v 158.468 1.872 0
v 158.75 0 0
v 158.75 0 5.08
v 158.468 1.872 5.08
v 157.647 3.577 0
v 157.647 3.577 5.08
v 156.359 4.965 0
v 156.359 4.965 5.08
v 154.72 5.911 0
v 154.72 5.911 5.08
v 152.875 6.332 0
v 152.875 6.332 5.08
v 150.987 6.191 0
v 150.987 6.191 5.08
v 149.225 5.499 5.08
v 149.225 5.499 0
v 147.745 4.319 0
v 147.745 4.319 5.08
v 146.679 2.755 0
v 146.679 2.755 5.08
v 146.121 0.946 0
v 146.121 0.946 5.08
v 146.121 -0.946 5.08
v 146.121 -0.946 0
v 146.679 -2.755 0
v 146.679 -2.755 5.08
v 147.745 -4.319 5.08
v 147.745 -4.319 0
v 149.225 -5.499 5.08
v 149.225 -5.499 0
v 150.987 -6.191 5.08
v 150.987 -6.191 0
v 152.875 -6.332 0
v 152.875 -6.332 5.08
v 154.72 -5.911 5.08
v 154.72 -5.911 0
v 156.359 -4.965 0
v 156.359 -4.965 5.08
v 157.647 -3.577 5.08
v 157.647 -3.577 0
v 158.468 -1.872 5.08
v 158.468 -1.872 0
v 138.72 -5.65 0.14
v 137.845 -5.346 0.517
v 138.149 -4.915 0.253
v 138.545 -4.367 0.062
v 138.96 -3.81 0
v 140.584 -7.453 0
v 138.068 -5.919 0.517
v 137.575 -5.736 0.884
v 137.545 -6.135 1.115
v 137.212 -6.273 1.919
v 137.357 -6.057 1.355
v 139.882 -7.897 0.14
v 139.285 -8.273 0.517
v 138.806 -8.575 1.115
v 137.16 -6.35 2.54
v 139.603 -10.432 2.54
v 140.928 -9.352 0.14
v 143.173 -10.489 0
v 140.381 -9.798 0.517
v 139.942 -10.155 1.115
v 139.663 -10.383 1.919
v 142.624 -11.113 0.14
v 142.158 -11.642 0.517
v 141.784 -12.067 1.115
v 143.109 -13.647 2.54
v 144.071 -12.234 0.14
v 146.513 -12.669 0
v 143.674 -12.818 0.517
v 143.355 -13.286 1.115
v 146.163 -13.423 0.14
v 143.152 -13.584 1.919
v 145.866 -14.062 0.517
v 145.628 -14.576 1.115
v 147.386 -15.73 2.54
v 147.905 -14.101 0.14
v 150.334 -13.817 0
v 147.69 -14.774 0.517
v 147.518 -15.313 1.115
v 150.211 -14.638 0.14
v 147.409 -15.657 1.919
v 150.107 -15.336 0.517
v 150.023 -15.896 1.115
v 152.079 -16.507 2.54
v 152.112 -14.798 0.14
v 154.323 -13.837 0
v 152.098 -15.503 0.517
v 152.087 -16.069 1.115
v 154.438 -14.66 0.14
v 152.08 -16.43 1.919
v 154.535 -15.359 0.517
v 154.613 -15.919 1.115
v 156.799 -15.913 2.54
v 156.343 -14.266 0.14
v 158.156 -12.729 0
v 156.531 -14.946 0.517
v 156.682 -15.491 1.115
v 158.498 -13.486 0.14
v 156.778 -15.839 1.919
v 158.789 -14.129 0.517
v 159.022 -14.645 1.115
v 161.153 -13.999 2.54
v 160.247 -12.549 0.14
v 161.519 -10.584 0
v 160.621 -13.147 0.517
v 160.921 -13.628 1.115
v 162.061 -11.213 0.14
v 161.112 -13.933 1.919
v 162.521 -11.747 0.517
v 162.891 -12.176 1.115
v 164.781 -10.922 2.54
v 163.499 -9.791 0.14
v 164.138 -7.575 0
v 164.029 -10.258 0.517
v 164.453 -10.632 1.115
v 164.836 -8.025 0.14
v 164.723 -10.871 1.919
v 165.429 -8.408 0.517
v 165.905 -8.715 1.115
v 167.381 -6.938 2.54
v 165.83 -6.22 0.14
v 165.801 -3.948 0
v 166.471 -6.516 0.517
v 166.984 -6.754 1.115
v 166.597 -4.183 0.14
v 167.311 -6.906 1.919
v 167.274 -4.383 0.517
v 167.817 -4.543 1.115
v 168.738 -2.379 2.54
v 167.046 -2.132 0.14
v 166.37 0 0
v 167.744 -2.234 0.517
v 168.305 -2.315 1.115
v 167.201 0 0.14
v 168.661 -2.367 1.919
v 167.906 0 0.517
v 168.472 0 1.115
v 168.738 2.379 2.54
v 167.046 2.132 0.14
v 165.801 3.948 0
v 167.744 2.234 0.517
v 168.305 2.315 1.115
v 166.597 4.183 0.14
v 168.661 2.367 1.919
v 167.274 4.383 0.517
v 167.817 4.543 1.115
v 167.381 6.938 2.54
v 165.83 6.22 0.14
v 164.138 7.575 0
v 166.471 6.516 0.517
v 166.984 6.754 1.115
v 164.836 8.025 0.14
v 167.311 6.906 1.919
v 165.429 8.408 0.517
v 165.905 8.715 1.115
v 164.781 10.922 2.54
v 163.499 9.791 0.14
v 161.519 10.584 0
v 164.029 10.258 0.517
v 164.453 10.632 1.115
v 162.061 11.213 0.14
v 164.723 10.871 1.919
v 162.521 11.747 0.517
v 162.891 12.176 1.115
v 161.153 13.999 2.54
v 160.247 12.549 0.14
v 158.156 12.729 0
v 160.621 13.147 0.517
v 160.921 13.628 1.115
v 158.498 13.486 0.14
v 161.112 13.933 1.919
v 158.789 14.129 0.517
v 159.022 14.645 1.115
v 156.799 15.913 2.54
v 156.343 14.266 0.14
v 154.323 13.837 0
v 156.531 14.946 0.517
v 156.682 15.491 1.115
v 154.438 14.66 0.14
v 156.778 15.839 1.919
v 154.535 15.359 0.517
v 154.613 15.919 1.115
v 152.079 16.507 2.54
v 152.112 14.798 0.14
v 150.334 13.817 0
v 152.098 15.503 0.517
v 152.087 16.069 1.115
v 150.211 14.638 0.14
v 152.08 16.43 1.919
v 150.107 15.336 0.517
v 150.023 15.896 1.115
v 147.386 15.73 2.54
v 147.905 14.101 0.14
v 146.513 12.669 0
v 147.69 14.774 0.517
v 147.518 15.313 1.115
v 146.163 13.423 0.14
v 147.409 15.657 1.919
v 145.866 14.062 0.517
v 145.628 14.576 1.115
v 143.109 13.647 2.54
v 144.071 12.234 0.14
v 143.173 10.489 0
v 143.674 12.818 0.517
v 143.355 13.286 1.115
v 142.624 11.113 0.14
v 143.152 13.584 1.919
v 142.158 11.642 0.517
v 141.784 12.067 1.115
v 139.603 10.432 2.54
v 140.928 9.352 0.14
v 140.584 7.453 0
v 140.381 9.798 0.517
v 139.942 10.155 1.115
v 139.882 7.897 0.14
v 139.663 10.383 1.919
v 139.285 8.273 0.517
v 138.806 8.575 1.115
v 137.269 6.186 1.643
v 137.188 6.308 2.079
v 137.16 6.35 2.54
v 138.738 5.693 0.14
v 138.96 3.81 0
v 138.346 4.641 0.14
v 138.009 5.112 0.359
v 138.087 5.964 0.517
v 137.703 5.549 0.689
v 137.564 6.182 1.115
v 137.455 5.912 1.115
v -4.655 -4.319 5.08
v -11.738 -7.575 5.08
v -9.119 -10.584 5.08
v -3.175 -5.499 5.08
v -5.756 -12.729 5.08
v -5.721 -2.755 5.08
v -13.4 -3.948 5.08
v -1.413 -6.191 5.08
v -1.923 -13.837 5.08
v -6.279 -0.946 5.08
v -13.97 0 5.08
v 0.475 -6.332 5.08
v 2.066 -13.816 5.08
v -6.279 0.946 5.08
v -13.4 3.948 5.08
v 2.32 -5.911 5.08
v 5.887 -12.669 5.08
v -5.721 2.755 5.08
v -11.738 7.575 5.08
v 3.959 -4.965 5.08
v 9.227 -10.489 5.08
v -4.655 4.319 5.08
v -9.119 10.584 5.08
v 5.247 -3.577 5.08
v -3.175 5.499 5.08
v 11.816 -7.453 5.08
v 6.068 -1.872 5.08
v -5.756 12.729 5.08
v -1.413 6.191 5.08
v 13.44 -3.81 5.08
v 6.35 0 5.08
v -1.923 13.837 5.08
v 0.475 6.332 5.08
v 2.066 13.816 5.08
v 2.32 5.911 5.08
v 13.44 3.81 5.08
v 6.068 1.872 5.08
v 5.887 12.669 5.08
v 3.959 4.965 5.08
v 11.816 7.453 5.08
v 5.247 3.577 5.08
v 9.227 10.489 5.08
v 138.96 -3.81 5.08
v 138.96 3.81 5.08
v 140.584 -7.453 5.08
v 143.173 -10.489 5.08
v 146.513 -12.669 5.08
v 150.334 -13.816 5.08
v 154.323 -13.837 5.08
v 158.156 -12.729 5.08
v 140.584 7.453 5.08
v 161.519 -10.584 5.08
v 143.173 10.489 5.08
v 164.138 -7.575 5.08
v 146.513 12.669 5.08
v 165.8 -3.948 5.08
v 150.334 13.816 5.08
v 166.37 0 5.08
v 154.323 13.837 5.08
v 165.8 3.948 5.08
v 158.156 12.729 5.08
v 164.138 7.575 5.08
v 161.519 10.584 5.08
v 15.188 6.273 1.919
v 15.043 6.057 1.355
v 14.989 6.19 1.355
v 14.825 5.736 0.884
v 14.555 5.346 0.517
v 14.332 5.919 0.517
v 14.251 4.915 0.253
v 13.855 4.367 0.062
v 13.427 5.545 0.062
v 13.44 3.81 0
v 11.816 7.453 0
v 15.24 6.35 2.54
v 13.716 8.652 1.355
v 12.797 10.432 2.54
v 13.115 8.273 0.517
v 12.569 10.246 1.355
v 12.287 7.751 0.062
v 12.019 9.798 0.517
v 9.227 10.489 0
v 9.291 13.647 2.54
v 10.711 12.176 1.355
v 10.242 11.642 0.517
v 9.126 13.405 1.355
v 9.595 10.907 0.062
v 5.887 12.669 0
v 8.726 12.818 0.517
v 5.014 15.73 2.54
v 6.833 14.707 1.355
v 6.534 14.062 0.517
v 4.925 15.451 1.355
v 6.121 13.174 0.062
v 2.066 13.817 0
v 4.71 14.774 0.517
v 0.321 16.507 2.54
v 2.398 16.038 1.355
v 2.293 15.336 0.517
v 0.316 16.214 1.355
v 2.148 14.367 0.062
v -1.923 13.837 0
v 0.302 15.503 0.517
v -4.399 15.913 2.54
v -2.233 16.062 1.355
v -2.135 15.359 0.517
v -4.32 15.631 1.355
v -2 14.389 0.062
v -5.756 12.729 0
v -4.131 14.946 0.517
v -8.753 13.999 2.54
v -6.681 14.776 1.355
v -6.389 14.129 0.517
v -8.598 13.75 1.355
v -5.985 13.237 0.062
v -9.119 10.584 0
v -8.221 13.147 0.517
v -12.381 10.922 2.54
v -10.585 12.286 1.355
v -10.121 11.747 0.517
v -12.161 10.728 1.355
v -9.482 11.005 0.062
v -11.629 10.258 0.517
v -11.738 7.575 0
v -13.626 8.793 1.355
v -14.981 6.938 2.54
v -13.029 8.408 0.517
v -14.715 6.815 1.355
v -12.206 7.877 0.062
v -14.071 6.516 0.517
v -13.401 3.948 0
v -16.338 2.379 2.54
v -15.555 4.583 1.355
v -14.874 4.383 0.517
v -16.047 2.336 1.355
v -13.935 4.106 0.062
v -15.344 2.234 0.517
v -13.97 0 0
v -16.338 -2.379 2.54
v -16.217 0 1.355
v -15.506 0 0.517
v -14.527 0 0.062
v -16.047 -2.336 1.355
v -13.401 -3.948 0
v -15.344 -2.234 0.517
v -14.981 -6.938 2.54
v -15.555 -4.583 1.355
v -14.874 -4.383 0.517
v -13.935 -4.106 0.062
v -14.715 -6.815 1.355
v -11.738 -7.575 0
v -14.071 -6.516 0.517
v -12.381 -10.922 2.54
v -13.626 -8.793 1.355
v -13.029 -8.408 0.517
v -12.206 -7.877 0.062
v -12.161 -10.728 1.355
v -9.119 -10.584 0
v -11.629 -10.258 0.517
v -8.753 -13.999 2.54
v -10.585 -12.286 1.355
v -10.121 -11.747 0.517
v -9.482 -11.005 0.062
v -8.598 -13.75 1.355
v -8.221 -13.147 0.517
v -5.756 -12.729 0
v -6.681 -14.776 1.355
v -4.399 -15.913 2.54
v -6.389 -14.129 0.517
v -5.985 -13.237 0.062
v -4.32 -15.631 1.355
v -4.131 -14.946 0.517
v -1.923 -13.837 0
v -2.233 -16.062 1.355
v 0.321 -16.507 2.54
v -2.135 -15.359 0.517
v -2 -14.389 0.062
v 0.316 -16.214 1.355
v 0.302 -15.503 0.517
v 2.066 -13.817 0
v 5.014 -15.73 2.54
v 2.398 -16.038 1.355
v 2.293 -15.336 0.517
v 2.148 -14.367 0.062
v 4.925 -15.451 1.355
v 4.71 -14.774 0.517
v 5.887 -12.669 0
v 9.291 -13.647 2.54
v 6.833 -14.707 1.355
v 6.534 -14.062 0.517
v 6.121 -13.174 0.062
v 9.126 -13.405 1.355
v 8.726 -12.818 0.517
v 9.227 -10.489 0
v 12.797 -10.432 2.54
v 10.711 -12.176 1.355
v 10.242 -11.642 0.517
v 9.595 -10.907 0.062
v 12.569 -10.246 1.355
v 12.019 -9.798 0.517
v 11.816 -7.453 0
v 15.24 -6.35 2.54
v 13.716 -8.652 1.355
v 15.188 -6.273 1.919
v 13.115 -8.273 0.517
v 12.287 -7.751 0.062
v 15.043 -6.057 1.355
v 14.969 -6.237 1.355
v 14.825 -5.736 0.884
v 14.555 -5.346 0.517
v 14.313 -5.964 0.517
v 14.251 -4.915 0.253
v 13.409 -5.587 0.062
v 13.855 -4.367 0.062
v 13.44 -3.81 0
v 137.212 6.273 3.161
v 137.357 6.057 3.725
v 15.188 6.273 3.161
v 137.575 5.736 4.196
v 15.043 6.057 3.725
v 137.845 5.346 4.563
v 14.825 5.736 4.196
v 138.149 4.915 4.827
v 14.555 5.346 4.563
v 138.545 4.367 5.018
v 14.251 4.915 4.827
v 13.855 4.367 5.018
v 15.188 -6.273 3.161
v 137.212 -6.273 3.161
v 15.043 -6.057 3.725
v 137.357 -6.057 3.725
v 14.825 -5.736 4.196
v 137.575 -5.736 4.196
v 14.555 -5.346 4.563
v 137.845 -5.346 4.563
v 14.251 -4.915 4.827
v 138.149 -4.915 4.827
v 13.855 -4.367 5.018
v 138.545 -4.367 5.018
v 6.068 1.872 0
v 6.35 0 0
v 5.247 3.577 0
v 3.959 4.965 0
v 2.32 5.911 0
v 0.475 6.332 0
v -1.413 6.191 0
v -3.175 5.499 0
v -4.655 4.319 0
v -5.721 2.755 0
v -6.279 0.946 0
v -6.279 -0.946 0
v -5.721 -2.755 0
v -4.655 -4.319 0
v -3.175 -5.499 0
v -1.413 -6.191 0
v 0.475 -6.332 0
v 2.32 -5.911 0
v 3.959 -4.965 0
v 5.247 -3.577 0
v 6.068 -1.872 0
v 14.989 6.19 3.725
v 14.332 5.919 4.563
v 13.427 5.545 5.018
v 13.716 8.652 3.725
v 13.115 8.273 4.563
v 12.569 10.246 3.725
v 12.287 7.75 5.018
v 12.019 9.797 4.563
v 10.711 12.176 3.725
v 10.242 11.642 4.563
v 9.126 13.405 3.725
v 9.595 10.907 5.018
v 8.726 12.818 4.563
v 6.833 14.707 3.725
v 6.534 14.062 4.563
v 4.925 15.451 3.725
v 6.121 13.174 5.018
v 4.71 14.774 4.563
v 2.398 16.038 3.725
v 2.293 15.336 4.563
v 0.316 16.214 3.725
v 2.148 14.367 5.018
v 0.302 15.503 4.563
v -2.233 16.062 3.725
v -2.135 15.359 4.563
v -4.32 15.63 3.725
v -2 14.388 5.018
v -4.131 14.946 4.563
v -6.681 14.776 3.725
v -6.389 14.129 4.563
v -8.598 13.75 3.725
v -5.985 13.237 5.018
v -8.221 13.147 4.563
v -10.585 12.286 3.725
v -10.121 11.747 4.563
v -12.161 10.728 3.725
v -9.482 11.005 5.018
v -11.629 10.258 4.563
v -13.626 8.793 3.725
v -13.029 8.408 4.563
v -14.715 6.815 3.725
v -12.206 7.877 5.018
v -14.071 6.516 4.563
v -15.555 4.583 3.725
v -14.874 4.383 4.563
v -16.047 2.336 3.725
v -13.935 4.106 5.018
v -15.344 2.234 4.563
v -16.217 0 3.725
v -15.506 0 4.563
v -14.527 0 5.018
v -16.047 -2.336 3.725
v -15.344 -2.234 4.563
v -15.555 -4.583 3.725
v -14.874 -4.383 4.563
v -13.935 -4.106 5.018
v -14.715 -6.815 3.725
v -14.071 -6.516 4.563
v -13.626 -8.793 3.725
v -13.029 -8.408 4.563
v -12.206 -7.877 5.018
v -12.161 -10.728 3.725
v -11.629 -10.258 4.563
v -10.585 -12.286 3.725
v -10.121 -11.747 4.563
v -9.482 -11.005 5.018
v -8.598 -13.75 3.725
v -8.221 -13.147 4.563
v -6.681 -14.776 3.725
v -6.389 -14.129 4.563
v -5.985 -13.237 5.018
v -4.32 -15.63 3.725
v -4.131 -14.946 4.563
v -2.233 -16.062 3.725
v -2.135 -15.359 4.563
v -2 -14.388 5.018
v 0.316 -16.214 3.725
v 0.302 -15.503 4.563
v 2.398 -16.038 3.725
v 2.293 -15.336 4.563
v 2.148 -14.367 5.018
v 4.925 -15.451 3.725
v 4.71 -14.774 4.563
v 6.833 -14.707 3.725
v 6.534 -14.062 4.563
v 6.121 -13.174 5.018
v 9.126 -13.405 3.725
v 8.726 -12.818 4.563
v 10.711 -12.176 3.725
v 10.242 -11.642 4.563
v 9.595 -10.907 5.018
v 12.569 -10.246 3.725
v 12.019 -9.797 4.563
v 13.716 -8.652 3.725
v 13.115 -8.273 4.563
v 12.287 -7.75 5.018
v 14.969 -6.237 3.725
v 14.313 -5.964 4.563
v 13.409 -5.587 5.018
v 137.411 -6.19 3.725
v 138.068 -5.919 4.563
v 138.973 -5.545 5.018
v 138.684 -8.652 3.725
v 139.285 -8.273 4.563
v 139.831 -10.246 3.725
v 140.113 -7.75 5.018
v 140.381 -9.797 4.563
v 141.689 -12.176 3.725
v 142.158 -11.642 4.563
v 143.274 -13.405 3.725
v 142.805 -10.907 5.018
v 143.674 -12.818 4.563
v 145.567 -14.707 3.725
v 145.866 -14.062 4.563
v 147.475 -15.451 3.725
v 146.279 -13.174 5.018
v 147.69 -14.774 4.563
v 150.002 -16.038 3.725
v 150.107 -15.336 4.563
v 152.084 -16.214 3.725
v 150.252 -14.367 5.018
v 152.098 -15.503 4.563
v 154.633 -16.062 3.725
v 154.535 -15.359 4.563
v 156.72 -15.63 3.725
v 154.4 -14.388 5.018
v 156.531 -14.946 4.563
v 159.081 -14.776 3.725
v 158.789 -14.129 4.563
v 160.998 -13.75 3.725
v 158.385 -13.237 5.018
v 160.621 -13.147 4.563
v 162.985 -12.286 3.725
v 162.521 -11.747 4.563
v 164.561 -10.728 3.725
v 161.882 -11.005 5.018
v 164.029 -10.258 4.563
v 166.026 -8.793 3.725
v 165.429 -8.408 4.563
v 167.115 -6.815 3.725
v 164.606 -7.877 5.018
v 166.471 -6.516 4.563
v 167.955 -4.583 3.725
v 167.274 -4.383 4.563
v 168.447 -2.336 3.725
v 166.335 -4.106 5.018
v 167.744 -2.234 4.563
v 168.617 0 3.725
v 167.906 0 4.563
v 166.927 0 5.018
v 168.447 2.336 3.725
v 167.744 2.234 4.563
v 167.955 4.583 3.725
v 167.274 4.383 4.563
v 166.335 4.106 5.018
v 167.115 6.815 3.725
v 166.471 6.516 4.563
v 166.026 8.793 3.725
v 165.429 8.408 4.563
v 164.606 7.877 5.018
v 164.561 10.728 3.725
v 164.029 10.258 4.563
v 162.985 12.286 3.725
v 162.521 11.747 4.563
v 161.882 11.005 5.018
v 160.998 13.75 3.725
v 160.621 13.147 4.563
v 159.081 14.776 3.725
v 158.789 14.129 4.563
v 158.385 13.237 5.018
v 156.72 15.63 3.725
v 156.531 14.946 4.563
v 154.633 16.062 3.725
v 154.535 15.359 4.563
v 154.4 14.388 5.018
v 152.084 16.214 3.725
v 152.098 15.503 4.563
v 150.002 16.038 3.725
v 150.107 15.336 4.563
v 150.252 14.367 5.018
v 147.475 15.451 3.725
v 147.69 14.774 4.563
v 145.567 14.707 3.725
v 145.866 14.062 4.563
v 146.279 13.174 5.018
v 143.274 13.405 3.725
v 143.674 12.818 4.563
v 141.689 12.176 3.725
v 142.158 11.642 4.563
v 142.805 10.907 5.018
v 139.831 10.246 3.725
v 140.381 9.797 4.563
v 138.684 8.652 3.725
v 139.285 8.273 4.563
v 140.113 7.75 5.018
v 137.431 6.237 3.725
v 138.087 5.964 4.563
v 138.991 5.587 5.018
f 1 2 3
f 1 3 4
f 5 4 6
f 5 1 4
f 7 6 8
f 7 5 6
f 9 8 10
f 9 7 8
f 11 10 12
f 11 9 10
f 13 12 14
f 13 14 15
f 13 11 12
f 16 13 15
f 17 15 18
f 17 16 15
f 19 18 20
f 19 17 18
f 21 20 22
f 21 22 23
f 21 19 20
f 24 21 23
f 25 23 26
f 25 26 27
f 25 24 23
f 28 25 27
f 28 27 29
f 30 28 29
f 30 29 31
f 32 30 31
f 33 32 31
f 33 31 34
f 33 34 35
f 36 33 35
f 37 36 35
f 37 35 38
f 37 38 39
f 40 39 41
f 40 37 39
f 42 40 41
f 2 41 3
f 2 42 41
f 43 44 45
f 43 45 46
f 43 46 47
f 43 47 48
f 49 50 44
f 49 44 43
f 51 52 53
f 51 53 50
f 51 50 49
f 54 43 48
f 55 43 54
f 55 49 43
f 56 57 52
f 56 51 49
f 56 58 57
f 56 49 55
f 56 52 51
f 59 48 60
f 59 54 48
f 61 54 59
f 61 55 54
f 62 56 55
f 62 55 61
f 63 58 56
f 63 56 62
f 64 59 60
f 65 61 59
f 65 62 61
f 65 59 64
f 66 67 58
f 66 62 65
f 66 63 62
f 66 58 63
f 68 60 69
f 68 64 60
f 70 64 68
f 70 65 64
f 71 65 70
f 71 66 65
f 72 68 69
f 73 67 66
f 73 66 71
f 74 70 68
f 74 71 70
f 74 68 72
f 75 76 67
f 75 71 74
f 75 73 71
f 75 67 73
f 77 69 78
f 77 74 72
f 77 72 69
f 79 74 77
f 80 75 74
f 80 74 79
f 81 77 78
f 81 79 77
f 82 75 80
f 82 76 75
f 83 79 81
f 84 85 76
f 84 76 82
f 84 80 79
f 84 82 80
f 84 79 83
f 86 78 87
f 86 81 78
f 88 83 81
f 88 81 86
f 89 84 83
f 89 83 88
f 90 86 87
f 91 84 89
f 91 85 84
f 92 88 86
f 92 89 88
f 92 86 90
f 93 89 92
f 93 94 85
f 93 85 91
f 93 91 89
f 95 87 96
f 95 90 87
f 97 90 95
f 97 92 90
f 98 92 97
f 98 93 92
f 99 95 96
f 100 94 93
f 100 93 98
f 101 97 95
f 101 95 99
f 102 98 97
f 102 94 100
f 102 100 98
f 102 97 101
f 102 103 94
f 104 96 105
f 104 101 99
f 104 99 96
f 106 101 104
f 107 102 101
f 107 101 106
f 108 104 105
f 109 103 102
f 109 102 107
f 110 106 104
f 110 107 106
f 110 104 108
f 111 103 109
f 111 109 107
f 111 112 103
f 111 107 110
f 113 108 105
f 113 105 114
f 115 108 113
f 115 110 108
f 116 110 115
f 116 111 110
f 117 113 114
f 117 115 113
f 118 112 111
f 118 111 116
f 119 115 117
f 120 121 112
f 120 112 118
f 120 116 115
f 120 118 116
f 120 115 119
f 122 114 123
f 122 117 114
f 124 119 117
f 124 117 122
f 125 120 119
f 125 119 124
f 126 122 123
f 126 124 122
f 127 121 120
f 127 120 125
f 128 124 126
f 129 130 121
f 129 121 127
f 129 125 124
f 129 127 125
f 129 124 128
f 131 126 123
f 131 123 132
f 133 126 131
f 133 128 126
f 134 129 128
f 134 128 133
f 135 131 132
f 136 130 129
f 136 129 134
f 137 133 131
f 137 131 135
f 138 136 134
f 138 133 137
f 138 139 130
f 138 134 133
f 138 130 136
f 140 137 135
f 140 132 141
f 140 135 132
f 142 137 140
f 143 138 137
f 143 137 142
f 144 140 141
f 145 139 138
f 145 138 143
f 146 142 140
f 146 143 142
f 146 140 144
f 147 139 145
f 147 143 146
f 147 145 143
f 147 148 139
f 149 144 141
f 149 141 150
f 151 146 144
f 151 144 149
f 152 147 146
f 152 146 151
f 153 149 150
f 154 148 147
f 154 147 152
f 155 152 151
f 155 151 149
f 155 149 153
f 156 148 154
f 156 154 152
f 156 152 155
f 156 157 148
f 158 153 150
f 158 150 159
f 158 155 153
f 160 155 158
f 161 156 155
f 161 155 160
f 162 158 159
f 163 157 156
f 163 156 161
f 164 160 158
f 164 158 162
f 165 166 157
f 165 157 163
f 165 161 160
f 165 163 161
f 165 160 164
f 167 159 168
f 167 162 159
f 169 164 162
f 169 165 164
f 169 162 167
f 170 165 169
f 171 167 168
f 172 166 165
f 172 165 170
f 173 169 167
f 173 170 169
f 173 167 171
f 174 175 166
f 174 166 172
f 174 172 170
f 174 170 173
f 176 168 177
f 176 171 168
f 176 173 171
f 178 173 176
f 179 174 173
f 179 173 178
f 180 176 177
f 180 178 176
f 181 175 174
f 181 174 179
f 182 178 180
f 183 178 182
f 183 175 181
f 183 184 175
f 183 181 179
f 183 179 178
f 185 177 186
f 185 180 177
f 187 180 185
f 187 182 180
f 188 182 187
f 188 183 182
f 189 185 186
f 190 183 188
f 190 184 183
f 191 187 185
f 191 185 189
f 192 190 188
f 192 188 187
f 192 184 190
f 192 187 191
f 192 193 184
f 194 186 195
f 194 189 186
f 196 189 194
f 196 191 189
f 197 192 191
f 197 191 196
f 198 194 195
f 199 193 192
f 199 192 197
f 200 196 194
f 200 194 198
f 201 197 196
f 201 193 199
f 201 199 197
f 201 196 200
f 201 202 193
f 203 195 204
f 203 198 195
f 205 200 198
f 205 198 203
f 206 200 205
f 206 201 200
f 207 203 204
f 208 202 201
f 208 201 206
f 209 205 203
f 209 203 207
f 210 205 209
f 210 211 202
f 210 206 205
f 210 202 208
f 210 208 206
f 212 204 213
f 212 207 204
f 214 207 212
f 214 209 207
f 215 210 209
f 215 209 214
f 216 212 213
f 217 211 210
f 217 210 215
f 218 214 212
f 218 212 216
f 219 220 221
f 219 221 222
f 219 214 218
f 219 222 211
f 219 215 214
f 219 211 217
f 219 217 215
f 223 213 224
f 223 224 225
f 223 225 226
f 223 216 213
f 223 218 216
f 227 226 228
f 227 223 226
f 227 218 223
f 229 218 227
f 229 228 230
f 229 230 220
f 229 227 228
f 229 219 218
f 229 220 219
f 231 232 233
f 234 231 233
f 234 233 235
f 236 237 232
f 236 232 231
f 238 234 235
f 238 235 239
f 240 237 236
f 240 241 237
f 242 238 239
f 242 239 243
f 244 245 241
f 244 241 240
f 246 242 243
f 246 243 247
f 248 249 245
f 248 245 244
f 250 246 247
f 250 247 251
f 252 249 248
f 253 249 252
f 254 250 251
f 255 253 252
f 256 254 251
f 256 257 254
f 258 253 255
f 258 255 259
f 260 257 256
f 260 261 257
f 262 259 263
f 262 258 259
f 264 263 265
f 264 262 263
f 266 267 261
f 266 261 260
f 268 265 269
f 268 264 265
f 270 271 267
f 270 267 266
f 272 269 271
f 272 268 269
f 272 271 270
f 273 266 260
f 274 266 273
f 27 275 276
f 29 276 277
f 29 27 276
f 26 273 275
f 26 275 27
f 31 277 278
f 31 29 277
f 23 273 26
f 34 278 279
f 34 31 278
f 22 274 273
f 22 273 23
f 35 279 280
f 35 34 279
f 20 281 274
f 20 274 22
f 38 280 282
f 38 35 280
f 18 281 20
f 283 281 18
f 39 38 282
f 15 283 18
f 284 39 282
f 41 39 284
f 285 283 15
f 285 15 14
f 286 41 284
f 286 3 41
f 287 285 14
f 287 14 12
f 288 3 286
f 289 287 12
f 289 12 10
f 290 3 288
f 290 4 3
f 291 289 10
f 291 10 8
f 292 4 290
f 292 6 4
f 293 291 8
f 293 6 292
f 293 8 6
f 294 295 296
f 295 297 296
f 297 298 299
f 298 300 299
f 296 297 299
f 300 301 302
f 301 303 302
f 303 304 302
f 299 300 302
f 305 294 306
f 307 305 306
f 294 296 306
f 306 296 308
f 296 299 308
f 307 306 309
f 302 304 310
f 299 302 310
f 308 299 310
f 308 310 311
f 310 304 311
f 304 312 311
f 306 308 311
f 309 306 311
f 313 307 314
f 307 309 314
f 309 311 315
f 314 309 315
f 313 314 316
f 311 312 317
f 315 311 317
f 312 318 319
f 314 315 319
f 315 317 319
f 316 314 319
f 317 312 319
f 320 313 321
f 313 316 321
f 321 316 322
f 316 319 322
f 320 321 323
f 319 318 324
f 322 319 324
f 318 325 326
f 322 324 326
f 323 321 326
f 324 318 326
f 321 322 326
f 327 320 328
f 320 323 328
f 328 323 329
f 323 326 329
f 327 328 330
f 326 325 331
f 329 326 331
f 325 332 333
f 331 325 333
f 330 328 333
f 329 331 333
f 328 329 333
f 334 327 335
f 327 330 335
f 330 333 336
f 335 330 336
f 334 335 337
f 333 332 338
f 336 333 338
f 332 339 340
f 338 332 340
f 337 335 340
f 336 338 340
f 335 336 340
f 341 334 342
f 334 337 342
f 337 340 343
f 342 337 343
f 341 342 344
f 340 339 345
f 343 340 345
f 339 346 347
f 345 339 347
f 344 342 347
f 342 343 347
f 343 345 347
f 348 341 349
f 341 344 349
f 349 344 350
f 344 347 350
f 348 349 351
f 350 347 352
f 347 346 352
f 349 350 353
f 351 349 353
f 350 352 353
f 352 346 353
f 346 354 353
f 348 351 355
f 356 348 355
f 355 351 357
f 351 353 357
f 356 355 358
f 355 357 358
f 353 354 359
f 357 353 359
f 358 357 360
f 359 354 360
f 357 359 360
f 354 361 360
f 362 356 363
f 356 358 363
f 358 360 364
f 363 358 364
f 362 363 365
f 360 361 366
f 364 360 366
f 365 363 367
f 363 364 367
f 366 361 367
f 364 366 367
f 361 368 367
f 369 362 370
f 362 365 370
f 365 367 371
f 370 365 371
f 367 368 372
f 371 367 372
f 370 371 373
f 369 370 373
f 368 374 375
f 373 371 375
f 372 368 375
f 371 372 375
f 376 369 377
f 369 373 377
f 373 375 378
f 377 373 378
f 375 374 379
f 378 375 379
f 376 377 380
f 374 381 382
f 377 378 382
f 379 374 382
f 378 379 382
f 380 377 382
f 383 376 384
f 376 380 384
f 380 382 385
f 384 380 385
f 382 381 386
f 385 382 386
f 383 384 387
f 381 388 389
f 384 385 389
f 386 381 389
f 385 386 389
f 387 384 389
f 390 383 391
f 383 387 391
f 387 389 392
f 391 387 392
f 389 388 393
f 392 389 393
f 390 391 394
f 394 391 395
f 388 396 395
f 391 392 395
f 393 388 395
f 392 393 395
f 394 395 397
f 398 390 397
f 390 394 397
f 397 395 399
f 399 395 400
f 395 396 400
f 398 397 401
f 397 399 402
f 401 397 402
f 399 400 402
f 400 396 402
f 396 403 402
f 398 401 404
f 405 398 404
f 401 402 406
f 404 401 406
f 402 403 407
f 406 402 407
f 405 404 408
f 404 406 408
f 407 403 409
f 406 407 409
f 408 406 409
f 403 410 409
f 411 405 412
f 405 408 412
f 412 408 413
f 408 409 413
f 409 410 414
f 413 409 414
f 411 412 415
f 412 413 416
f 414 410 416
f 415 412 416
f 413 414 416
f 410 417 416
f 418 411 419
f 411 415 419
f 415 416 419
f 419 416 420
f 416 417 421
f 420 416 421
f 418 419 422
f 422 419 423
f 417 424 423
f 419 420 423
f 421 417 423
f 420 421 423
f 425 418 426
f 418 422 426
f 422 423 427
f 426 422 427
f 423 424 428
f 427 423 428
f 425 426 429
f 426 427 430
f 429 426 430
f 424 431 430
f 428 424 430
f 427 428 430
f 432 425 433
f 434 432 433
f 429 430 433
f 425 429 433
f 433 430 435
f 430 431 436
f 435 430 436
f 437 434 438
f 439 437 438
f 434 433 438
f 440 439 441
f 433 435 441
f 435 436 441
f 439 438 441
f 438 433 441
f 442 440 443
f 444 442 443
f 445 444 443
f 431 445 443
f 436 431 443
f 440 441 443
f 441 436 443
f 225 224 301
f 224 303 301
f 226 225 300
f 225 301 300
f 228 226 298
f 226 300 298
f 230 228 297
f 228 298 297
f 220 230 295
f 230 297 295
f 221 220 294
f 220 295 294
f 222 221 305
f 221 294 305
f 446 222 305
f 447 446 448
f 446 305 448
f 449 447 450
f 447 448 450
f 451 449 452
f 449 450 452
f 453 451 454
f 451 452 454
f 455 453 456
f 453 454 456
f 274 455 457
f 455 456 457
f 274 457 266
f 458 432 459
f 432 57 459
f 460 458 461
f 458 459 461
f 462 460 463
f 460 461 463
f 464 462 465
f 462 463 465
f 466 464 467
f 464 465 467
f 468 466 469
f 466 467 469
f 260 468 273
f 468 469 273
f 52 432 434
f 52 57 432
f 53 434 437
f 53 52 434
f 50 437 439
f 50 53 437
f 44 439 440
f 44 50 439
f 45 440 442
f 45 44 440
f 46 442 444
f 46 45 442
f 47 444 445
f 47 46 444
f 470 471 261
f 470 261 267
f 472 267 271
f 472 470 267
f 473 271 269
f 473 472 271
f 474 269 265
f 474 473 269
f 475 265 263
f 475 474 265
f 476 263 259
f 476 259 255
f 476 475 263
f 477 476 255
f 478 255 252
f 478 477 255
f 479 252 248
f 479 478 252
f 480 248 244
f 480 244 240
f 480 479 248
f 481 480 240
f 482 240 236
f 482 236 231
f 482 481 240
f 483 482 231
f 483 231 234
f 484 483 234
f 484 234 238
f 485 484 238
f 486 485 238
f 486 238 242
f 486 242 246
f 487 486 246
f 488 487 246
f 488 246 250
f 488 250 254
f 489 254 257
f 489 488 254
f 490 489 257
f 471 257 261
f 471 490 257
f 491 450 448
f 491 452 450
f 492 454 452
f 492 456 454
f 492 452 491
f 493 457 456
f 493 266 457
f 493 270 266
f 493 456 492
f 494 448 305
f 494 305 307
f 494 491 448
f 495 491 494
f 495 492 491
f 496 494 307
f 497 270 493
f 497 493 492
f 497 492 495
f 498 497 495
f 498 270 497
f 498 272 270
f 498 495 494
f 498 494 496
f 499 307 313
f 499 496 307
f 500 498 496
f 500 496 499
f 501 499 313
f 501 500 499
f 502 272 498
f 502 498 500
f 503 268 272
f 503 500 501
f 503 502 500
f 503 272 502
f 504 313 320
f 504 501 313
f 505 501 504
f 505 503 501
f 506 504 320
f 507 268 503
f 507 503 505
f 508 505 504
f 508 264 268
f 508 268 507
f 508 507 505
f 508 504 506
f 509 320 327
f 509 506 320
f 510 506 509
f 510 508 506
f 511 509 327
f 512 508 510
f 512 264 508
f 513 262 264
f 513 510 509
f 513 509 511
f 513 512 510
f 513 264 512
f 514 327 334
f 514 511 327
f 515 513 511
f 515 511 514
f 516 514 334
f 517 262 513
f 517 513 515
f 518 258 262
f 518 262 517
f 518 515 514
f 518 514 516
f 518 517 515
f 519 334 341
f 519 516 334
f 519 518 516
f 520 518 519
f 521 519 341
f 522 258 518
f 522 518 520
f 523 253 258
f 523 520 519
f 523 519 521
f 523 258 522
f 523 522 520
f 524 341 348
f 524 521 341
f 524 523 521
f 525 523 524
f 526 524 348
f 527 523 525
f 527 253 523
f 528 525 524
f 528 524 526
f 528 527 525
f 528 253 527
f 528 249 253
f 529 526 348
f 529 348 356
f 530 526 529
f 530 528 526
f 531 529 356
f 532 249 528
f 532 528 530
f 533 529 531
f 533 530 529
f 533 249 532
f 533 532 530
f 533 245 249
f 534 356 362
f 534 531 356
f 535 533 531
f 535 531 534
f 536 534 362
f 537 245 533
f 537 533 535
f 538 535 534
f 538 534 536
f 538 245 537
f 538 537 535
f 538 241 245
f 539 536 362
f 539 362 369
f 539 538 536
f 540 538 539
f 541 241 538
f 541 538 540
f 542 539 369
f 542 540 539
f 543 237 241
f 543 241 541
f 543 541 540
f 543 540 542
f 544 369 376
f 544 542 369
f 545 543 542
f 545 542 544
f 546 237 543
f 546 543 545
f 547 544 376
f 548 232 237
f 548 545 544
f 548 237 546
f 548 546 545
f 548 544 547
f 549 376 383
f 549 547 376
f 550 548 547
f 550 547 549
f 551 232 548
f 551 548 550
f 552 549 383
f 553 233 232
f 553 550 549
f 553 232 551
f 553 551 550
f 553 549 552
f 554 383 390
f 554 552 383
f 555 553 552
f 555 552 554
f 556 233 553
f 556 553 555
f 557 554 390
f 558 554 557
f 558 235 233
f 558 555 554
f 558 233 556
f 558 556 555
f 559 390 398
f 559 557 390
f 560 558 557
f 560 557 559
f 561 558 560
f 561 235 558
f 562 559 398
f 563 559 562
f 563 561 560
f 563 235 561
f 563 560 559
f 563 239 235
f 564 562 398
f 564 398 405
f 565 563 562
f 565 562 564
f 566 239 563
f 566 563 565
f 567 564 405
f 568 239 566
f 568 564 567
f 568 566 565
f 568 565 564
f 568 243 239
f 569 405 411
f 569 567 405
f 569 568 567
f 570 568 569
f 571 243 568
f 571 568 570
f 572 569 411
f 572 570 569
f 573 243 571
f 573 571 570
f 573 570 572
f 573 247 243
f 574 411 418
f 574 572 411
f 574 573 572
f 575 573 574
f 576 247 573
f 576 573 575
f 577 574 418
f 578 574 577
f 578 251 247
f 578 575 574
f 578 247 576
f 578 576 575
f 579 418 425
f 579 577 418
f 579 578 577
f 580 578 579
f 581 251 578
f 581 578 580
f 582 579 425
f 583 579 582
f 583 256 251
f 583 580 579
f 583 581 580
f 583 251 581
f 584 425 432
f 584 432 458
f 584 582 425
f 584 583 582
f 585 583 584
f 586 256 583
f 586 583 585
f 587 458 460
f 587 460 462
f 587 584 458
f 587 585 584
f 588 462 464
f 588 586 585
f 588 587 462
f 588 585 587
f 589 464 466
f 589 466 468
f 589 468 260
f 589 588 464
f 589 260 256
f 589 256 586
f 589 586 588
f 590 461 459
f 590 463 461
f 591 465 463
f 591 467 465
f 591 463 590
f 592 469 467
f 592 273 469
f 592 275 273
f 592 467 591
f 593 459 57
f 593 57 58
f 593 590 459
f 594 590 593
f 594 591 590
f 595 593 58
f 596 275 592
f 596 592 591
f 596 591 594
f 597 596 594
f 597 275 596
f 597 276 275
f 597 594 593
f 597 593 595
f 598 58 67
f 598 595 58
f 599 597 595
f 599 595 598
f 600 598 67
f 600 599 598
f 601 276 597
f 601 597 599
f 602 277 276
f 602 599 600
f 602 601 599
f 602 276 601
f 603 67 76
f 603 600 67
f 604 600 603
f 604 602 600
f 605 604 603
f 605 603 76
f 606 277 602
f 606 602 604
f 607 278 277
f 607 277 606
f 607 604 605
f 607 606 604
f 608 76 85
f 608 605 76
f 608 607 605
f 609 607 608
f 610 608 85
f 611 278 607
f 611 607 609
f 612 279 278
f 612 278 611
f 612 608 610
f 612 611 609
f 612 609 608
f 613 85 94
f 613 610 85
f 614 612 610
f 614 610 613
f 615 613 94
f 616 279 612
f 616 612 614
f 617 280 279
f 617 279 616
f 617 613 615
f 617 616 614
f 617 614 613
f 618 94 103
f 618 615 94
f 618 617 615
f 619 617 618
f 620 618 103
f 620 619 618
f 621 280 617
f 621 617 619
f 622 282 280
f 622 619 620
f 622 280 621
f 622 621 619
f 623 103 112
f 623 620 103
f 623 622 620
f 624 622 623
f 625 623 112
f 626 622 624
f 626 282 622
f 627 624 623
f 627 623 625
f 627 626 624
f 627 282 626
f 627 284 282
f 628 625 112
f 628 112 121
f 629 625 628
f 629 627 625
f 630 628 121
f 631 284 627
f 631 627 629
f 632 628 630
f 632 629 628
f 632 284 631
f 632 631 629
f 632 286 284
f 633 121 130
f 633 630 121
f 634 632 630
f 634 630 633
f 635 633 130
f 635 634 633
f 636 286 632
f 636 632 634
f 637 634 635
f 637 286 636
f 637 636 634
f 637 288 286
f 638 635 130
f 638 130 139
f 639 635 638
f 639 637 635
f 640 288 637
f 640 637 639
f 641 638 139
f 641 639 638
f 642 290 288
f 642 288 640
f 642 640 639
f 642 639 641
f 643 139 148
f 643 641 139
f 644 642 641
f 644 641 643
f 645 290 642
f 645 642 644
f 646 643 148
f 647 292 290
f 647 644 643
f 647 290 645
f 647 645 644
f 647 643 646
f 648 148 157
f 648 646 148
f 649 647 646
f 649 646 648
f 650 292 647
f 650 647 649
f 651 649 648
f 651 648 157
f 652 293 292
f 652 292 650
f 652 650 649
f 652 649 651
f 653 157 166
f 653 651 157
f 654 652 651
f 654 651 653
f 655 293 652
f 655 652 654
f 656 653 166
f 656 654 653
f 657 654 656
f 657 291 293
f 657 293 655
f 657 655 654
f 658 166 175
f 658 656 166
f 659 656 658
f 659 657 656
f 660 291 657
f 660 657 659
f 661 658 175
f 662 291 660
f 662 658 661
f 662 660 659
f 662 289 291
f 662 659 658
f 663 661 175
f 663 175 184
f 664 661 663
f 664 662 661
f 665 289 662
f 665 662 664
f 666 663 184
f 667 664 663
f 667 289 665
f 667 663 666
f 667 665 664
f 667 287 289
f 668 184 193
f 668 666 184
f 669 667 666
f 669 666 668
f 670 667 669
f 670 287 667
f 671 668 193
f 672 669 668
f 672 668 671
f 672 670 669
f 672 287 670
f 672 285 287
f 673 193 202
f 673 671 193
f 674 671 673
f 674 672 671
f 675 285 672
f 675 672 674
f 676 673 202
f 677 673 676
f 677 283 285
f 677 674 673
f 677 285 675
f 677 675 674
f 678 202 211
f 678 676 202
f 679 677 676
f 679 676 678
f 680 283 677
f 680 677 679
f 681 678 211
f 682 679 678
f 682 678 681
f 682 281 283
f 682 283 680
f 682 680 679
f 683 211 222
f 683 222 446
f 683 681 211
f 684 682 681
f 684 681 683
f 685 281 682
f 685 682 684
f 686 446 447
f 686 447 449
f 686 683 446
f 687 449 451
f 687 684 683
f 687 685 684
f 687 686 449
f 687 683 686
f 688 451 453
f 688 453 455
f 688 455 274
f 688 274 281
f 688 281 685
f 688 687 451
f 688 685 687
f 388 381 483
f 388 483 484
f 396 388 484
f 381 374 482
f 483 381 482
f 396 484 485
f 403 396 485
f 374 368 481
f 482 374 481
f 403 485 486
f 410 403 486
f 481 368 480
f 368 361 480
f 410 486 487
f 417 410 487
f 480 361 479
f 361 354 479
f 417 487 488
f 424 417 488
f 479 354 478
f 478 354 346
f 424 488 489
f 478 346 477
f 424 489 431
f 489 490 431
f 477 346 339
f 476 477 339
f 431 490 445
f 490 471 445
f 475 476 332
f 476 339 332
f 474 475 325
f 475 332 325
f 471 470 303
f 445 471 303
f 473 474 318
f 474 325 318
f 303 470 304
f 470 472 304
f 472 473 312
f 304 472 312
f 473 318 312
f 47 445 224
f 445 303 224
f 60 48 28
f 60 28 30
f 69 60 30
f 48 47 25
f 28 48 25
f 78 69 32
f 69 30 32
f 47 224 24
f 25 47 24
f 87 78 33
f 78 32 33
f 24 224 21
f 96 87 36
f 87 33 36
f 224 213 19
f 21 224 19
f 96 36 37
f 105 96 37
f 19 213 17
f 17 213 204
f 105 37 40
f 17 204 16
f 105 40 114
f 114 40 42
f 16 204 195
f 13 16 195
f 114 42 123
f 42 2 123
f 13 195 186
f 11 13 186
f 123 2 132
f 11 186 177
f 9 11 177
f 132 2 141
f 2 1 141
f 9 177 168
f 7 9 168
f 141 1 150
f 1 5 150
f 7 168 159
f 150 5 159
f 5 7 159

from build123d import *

# Parameters (mm, degrees)
SKETCH1_R           = 6.35
BOSS_EXTRUDE1_DEPTH = 5.08
FILLET1_R           = 2.54
FILLET2_R           = 2.54


with BuildPart() as part:
    # Sketch1 → Boss-Extrude1 (new body)
    with BuildSketch(Plane.XY):
        with BuildLine():
            Line((15.24, -6.35), (137.16, -6.35))
            ThreePointArc((137.16, -6.35), (168.91, 0), (137.16, 6.35))
            Line((137.16, 6.35), (15.24, 6.35))
            ThreePointArc((15.24, 6.35), (-16.51, 0), (15.24, -6.35))
        make_face()
        Circle(SKETCH1_R, mode=Mode.SUBTRACT)
        with Locations((152.4, 0)):
            Circle(SKETCH1_R, mode=Mode.SUBTRACT)
    extrude(amount=BOSS_EXTRUDE1_DEPTH)

    # Fillet1
    fillet1_edges = [part.edges().sort_by_distance(p)[0] for p in [
        (-16.51, 0, 5.08),
        (76.2, -6.35, 5.08),
        (168.91, 0, 5.08),
        (76.2, 6.35, 5.08),
    ]]
    fillet(fillet1_edges, radius=FILLET1_R)

    # Fillet2
    fillet2_edges = [part.edges().sort_by_distance(p)[0] for p in [
        (76.2, -6.35, 0),
        (-16.51, 0, 0),
        (76.2, 6.35, 0),
        (168.91, 0, 0),
    ]]
    fillet(fillet2_edges, radius=FILLET2_R - 0.0001)  # a hair under: the kernel refuses the full size


solid = part.part
